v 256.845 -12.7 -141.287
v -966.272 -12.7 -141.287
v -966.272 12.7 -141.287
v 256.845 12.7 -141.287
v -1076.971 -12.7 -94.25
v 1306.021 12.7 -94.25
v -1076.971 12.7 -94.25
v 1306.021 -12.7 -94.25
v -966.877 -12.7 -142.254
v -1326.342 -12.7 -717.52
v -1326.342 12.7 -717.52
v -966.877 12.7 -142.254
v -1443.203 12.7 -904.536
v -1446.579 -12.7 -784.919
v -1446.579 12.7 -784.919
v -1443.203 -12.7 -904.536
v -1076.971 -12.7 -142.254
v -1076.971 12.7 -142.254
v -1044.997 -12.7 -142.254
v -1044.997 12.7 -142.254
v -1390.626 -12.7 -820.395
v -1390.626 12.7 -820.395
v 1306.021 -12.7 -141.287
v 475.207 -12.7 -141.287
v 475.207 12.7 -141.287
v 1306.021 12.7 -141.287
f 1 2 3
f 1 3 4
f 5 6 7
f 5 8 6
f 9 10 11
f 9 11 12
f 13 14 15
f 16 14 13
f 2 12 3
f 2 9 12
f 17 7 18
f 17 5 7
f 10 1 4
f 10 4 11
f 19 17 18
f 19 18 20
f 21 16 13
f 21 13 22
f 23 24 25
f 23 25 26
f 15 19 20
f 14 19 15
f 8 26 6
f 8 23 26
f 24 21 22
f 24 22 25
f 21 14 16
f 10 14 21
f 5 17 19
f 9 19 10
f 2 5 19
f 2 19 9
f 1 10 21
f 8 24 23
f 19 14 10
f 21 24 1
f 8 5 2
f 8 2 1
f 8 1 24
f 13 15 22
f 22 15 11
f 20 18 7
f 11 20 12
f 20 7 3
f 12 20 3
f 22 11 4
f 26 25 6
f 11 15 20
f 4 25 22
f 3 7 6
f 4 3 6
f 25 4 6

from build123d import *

# Parameters (mm, degrees)
F1_DEPTH = 12.7


with BuildPart() as f1:
    # F0 (on Front) → F1 (new body, symmetric)
    with BuildSketch(Plane.XZ):
        Polygon((-598.979303, -141.286989), (-598.979303, -94.24994), (-1076.970816, -94.24994), (-1076.970816, -142.254412), (-1044.996943, -142.254412), (-966.876544, -142.254412), (-966.272031, -141.286989), align=None)
        Polygon((1306.020697, -94.24994), (-598.979303, -94.24994), (-598.979303, -141.286989), (256.845117, -141.286989), (475.207098, -141.286989), (1306.020697, -141.286989), align=None)
        Polygon((475.207098, -141.286989), (256.845117, -141.286989), (-1326.34247, -717.520147), (-1390.625515, -820.394523), align=None)
        Polygon((-1390.625515, -820.394523), (-1326.34247, -717.520147), (-966.876544, -142.254412), (-1044.996943, -142.254412), (-1446.578518, -784.919273), (-1443.203137, -904.536307), align=None)
    extrude(amount=F1_DEPTH, both=True)


solid = f1.part
